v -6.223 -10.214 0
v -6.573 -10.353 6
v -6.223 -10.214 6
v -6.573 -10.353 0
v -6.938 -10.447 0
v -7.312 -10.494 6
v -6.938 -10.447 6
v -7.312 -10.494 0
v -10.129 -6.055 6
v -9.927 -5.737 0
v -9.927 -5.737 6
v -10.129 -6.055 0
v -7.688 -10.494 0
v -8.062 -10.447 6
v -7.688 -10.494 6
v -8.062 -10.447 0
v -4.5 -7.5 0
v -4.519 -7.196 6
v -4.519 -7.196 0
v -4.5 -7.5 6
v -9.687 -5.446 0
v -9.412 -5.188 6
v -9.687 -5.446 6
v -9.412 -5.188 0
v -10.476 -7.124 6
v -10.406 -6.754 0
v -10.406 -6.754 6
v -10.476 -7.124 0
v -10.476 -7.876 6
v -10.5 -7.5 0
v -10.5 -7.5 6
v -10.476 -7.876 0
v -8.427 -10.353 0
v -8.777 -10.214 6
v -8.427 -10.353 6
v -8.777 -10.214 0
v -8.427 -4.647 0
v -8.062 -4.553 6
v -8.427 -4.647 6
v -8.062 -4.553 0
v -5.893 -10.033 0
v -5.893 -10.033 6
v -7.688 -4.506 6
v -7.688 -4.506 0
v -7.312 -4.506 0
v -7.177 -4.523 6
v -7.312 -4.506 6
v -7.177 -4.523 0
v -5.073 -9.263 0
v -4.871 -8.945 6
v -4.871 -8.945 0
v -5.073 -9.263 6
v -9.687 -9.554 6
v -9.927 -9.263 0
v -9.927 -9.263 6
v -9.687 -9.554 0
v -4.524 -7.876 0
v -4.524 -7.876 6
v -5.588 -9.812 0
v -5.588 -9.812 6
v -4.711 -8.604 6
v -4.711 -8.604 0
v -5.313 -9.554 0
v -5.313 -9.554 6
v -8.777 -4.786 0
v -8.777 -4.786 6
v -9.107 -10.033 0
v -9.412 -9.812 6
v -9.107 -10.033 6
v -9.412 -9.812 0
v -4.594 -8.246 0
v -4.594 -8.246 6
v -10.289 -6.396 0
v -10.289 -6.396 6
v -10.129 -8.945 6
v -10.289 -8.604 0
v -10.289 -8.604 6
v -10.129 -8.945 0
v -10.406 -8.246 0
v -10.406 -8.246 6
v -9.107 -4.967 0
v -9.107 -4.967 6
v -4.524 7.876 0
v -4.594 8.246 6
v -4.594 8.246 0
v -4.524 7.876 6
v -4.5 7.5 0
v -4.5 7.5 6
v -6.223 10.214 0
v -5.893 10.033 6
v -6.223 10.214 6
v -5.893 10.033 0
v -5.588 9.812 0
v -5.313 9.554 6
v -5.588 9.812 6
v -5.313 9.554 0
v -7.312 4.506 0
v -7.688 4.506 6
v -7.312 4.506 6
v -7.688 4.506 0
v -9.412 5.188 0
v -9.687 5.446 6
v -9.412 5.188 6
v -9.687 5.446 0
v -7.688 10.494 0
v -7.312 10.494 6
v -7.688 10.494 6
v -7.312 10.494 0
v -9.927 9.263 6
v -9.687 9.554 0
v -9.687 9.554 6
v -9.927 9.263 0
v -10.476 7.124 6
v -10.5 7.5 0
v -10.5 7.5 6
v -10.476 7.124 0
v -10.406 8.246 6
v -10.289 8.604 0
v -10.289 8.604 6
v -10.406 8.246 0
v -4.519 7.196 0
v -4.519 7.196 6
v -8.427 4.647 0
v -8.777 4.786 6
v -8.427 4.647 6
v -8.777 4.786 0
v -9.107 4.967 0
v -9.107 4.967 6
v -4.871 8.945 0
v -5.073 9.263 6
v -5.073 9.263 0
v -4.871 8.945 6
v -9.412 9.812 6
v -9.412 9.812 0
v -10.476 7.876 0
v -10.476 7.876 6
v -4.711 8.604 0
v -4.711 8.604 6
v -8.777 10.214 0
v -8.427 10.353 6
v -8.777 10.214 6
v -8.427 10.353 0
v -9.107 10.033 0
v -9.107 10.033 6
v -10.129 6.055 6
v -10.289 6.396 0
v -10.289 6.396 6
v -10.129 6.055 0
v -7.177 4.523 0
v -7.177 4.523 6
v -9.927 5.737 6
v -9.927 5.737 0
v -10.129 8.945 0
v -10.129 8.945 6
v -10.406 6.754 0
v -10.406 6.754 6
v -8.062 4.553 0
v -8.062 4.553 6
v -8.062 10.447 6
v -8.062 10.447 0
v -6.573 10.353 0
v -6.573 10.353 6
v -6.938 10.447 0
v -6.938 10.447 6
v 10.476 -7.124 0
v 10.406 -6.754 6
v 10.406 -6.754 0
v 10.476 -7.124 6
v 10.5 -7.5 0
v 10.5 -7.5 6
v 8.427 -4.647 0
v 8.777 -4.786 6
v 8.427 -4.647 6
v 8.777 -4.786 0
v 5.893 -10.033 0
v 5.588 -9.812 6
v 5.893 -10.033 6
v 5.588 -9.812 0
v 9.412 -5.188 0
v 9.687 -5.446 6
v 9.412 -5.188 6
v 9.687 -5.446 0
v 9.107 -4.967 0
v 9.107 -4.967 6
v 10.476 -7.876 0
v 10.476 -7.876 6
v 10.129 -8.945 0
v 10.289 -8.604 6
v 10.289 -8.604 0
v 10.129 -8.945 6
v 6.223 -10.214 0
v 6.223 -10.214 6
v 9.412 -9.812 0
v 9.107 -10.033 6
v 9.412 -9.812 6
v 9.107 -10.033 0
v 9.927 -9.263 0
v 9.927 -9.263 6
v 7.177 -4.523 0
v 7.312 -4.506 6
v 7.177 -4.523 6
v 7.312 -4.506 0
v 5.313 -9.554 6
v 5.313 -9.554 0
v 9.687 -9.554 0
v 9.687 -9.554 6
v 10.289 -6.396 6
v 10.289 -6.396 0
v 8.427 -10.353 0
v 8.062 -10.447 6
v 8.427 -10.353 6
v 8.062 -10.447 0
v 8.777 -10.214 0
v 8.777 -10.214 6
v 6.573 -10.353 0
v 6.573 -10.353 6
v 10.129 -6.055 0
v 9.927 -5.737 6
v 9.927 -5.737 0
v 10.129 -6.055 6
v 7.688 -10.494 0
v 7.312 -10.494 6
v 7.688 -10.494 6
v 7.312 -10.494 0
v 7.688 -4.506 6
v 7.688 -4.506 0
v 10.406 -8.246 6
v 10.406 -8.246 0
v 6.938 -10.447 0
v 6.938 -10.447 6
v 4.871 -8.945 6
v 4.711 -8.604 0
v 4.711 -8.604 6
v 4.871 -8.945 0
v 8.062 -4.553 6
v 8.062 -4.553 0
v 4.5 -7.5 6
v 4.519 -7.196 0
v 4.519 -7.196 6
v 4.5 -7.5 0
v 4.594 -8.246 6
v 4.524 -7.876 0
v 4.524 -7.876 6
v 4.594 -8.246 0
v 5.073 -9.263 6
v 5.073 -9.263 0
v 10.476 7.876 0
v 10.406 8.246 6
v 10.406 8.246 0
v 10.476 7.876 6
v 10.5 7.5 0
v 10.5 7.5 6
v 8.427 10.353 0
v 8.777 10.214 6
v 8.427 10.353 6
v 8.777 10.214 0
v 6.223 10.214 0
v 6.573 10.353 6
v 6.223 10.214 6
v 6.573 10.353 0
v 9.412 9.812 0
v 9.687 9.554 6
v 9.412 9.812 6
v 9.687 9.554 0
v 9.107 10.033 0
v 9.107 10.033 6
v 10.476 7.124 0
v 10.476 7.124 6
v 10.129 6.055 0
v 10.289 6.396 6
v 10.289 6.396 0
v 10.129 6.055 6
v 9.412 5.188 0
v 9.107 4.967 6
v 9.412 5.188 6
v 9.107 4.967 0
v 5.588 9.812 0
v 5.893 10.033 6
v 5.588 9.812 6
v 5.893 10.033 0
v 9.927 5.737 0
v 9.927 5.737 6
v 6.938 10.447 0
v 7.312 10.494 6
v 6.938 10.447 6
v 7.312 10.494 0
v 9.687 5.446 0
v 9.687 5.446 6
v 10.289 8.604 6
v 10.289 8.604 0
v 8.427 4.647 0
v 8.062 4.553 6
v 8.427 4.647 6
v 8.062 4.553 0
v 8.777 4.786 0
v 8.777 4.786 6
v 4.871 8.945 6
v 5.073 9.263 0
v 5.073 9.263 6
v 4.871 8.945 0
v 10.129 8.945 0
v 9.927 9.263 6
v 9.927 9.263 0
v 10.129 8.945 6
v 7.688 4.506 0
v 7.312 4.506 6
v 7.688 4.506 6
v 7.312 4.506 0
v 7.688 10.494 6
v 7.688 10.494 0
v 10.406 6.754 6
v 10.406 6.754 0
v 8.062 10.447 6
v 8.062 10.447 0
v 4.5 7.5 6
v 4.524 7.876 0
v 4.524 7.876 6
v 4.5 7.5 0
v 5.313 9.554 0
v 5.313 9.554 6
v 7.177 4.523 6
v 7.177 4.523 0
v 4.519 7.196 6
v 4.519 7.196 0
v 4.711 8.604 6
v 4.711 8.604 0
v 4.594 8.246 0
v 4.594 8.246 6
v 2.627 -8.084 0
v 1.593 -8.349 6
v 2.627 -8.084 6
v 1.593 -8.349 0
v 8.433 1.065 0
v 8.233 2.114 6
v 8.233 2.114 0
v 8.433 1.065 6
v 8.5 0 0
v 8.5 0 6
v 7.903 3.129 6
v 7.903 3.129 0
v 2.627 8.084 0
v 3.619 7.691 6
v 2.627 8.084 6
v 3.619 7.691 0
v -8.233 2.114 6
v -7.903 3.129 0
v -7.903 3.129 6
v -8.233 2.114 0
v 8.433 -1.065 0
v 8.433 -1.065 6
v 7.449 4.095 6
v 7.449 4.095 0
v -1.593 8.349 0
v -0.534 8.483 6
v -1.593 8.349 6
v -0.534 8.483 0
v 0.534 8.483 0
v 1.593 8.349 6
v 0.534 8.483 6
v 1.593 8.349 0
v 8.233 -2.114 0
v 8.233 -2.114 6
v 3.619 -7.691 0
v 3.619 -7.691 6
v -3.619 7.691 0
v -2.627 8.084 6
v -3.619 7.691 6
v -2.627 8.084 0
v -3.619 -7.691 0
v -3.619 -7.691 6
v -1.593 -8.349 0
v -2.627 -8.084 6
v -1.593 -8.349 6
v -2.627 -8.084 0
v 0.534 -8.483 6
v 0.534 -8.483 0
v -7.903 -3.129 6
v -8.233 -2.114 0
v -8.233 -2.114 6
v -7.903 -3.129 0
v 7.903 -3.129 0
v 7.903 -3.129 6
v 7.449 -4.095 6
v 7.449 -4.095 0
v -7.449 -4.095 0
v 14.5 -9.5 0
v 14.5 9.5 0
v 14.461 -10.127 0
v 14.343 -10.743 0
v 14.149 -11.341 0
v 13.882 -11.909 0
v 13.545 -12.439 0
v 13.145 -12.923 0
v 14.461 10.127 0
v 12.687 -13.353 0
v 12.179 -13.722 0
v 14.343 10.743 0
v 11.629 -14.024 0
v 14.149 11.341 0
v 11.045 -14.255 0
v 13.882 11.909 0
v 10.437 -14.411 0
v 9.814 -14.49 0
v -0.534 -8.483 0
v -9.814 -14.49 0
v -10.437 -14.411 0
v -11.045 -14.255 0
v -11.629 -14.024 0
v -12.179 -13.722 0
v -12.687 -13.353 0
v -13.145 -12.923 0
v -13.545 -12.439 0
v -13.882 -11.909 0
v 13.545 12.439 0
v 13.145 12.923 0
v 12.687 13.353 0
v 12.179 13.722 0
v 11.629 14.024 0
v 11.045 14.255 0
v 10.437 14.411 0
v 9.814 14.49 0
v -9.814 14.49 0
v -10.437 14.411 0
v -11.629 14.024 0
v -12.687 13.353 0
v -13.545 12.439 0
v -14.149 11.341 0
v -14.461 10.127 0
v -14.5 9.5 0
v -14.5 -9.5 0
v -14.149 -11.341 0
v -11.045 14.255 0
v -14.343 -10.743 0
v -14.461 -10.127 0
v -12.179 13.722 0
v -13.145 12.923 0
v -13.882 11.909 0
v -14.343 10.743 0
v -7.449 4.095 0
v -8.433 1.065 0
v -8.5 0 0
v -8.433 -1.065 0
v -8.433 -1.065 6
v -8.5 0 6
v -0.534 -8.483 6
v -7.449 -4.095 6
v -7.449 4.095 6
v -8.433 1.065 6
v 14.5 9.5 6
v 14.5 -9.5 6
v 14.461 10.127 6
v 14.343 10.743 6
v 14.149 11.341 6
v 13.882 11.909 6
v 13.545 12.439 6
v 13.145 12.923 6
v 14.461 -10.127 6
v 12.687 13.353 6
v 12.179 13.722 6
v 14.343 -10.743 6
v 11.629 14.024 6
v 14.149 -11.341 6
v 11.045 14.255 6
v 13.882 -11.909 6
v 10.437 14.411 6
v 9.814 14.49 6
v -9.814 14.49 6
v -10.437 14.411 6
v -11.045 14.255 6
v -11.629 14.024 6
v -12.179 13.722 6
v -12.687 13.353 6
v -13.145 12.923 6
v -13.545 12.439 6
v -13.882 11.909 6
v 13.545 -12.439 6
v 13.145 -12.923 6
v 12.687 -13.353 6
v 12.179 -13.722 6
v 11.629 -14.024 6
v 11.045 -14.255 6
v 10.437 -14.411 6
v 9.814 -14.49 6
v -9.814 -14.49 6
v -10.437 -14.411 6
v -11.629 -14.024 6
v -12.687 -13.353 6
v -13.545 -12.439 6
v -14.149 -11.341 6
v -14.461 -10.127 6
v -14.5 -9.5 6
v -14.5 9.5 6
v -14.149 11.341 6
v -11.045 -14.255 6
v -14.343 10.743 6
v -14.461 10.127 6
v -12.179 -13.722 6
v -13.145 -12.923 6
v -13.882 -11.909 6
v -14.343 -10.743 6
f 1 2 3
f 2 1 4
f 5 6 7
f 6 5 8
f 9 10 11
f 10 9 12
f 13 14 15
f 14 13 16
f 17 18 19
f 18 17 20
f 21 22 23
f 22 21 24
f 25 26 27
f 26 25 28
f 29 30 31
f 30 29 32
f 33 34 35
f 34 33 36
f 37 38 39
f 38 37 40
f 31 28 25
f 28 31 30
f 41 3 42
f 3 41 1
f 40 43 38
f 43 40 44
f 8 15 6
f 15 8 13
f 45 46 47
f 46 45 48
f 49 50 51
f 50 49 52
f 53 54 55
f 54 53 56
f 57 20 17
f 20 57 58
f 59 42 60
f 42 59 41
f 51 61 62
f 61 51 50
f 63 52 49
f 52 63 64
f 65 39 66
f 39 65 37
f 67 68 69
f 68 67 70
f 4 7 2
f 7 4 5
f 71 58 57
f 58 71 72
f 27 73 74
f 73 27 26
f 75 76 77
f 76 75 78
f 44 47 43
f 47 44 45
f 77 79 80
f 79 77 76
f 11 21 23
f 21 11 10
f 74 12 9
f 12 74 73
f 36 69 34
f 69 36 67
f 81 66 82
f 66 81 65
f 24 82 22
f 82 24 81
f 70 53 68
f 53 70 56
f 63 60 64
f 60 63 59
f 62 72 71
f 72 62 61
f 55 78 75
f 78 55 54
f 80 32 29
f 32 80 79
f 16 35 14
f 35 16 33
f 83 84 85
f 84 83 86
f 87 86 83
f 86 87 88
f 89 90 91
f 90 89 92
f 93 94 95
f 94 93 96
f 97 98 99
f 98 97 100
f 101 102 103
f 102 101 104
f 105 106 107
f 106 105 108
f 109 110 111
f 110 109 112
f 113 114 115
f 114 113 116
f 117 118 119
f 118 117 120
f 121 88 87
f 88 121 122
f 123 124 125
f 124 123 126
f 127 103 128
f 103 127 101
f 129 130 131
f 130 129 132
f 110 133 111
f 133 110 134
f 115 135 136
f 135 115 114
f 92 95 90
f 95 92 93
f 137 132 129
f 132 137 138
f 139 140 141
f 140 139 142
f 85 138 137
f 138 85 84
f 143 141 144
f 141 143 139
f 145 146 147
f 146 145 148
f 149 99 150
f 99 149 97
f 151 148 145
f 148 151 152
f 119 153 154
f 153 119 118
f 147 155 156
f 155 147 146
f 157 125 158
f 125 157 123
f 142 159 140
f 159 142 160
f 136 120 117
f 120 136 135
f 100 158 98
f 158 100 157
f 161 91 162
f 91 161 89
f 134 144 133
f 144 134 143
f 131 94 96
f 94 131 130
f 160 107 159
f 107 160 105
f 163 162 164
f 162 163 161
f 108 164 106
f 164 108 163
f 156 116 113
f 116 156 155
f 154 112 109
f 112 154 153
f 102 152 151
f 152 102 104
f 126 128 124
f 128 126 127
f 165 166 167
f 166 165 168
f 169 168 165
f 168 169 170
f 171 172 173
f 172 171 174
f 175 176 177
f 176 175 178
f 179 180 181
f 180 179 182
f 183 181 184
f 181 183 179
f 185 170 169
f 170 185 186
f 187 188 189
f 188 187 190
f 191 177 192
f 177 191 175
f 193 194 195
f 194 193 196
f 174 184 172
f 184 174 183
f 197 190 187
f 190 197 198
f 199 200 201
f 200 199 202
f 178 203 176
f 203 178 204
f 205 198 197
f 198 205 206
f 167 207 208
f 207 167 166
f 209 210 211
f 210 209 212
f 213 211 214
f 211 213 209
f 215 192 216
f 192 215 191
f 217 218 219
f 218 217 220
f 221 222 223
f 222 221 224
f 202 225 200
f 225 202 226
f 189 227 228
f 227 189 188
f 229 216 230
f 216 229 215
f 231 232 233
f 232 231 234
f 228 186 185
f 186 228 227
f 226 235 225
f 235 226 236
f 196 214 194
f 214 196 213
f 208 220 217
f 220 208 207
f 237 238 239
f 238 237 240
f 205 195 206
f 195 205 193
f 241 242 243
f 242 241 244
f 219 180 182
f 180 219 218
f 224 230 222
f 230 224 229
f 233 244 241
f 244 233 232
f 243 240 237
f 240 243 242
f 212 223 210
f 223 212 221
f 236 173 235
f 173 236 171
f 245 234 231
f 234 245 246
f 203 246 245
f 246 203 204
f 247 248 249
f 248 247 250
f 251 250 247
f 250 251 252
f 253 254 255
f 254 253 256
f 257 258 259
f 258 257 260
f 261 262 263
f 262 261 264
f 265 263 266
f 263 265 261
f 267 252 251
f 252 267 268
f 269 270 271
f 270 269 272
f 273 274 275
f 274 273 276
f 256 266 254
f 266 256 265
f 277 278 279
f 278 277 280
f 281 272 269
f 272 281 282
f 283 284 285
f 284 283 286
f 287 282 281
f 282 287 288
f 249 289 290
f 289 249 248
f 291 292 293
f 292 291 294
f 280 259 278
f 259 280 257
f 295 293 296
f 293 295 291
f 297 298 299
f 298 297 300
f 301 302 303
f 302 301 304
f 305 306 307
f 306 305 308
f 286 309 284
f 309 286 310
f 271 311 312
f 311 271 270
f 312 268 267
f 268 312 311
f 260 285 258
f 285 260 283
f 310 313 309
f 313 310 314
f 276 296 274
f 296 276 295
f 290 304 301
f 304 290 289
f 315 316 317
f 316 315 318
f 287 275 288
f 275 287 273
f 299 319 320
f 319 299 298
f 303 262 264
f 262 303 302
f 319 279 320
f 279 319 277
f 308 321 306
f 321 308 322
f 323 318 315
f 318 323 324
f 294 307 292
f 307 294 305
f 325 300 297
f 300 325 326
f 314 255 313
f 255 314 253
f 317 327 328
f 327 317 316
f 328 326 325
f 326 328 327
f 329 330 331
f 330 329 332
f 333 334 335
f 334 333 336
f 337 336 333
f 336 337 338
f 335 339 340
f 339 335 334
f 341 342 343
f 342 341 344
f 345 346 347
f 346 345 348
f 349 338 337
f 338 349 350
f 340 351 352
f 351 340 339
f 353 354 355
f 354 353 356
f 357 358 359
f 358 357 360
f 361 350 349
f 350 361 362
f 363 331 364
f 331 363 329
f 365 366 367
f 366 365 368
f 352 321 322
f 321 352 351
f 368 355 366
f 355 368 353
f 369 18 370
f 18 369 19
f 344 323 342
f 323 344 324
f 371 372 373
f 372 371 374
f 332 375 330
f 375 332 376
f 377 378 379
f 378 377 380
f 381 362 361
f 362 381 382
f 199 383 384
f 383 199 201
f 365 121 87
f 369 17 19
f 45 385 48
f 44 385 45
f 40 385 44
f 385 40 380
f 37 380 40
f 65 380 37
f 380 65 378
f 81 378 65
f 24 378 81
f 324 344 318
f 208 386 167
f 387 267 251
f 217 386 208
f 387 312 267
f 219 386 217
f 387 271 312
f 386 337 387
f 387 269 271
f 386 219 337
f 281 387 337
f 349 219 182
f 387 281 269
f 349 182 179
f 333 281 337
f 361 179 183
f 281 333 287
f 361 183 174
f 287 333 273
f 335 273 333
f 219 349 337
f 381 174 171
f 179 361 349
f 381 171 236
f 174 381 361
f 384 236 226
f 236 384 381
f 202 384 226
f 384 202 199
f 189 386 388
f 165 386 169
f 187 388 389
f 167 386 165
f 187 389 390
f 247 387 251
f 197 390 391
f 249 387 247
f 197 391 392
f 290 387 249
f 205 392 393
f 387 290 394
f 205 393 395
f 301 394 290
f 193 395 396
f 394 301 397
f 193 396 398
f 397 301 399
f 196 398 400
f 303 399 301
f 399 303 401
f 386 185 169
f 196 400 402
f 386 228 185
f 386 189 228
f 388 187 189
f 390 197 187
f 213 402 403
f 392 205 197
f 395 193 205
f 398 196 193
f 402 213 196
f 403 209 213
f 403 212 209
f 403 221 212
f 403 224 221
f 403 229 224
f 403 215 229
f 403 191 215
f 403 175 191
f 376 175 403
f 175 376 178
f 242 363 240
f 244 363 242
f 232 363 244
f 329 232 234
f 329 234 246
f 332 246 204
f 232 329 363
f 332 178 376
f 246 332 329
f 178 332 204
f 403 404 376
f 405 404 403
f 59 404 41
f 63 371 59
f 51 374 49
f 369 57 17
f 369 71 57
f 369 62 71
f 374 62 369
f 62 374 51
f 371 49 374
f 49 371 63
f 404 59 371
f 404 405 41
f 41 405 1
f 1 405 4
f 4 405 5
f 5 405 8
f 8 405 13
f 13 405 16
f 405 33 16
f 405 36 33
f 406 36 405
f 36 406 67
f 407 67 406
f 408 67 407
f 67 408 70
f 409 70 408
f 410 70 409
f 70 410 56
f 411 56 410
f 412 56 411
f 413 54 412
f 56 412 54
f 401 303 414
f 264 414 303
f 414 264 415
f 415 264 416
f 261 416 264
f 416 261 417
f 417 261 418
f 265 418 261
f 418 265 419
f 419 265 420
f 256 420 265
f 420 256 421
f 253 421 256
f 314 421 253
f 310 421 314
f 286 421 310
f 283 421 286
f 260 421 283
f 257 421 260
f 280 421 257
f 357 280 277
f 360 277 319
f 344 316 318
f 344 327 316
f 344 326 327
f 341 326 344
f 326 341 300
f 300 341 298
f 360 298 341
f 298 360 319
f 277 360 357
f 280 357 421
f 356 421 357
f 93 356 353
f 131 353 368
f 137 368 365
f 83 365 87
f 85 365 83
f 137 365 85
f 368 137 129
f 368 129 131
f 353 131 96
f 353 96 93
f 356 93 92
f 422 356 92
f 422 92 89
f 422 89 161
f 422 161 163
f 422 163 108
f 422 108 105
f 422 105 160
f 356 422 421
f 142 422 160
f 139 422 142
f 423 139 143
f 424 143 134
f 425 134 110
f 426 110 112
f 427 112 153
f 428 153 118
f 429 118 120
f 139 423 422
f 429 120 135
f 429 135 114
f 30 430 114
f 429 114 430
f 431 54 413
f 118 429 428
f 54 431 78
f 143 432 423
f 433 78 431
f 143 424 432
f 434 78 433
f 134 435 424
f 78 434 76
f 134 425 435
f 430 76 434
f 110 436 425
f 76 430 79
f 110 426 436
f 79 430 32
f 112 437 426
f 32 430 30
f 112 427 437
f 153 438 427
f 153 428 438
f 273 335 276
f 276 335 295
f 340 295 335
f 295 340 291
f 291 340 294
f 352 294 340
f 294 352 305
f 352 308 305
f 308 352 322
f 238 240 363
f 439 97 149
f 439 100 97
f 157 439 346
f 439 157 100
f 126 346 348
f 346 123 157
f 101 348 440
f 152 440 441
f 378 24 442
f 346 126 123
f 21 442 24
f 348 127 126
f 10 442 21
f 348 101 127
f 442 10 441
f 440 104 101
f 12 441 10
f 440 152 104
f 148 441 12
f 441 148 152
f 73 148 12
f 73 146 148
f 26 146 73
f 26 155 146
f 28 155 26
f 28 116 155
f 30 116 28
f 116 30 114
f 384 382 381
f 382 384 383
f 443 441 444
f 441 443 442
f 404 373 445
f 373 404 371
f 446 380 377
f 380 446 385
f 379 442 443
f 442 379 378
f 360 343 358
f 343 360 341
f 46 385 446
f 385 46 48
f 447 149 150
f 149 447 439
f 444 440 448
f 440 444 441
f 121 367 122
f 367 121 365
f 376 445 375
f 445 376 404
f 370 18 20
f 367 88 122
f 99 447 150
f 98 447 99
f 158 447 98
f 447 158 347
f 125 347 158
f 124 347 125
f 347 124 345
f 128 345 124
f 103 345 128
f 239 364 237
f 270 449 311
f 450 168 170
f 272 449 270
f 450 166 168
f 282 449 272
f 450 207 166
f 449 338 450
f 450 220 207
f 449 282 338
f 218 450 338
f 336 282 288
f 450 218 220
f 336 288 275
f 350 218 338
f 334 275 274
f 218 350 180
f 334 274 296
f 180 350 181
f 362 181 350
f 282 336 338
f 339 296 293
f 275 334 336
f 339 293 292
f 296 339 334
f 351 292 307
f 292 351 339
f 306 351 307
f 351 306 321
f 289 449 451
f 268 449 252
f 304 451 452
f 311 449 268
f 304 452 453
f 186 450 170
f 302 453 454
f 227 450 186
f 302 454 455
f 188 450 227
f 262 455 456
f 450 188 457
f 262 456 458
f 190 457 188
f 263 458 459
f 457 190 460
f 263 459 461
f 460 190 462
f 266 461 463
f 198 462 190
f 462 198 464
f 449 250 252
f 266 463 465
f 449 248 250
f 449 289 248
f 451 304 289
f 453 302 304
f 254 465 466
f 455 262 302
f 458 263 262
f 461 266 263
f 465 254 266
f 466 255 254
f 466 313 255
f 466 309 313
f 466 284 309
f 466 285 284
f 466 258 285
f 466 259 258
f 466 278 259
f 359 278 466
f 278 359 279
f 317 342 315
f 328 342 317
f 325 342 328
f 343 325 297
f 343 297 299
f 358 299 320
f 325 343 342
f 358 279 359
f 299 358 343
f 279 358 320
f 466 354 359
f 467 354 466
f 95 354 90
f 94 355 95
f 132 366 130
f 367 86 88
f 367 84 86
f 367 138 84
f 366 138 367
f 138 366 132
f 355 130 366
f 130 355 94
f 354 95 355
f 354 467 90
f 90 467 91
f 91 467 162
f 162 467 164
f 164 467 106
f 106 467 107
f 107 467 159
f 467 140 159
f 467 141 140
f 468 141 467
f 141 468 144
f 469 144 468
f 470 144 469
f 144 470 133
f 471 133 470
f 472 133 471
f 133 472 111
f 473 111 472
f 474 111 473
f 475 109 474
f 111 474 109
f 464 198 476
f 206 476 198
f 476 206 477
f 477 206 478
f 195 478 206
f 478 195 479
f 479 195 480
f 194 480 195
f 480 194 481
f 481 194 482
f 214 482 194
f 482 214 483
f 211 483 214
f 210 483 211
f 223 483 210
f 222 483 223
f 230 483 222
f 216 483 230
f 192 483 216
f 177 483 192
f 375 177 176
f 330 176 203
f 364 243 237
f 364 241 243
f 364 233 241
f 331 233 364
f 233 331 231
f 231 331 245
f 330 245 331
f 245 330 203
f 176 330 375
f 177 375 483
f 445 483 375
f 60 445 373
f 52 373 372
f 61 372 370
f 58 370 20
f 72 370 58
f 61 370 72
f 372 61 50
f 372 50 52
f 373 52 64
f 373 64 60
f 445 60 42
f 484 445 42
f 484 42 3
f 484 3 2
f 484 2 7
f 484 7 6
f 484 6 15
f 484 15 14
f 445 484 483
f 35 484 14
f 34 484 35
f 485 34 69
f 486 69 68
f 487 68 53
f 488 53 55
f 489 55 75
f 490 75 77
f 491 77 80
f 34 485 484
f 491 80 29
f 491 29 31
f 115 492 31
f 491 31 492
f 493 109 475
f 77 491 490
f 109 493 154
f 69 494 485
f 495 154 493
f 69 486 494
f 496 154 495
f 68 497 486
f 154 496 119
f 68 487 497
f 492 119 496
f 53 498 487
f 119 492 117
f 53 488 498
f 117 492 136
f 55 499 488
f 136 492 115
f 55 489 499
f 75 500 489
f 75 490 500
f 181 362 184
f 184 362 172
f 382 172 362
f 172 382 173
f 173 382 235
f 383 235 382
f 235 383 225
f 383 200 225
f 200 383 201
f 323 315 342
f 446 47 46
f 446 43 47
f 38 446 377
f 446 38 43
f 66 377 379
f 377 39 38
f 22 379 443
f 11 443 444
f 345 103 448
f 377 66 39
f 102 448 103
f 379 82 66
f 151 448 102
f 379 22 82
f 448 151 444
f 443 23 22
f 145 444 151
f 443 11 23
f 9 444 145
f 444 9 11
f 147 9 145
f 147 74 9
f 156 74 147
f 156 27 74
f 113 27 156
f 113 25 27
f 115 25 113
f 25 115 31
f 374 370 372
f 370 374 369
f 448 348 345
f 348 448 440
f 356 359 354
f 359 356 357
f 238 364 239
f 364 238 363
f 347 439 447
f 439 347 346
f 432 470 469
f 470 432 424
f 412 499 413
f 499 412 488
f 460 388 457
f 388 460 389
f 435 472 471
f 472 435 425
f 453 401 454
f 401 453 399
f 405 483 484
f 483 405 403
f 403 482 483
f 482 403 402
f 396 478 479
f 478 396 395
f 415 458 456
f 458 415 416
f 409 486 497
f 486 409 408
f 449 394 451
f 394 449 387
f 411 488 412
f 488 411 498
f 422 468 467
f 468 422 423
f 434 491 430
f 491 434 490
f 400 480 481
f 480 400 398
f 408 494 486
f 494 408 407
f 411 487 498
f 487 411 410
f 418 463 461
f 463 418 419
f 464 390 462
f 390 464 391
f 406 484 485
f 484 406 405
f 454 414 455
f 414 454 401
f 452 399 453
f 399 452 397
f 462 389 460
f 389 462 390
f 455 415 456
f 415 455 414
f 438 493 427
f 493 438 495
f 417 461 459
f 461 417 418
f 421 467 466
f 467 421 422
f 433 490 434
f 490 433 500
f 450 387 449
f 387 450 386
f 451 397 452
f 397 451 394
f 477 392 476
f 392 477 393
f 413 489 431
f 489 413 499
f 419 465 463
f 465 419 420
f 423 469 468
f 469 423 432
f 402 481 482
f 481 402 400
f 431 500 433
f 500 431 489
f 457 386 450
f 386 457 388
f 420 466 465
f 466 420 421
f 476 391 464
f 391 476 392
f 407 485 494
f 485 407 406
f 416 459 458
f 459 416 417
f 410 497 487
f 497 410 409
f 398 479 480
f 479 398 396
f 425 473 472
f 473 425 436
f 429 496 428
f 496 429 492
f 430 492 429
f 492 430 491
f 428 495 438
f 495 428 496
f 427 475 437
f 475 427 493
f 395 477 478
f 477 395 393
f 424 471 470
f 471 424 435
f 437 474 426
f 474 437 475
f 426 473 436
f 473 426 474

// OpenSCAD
$fn = 50;


difference() {
	union() {
		hull() {
			translate(v = [-9.5000000000, 9.5000000000, 0]) {
				cylinder(h = 6, r = 5);
			}
			translate(v = [9.5000000000, 9.5000000000, 0]) {
				cylinder(h = 6, r = 5);
			}
			translate(v = [-9.5000000000, -9.5000000000, 0]) {
				cylinder(h = 6, r = 5);
			}
			translate(v = [9.5000000000, -9.5000000000, 0]) {
				cylinder(h = 6, r = 5);
			}
		}
	}
	union() {
		#translate(v = [-7.5000000000, -7.5000000000, -100.0000000000]) {
			cylinder(h = 200, r = 3.0000000000);
		}
		#translate(v = [-7.5000000000, 7.5000000000, -100.0000000000]) {
			cylinder(h = 200, r = 3.0000000000);
		}
		#translate(v = [7.5000000000, -7.5000000000, -100.0000000000]) {
			cylinder(h = 200, r = 3.0000000000);
		}
		#translate(v = [7.5000000000, 7.5000000000, -100.0000000000]) {
			cylinder(h = 200, r = 3.0000000000);
		}
		#cylinder(h = 6, r = 8.5000000000);
	}
}
